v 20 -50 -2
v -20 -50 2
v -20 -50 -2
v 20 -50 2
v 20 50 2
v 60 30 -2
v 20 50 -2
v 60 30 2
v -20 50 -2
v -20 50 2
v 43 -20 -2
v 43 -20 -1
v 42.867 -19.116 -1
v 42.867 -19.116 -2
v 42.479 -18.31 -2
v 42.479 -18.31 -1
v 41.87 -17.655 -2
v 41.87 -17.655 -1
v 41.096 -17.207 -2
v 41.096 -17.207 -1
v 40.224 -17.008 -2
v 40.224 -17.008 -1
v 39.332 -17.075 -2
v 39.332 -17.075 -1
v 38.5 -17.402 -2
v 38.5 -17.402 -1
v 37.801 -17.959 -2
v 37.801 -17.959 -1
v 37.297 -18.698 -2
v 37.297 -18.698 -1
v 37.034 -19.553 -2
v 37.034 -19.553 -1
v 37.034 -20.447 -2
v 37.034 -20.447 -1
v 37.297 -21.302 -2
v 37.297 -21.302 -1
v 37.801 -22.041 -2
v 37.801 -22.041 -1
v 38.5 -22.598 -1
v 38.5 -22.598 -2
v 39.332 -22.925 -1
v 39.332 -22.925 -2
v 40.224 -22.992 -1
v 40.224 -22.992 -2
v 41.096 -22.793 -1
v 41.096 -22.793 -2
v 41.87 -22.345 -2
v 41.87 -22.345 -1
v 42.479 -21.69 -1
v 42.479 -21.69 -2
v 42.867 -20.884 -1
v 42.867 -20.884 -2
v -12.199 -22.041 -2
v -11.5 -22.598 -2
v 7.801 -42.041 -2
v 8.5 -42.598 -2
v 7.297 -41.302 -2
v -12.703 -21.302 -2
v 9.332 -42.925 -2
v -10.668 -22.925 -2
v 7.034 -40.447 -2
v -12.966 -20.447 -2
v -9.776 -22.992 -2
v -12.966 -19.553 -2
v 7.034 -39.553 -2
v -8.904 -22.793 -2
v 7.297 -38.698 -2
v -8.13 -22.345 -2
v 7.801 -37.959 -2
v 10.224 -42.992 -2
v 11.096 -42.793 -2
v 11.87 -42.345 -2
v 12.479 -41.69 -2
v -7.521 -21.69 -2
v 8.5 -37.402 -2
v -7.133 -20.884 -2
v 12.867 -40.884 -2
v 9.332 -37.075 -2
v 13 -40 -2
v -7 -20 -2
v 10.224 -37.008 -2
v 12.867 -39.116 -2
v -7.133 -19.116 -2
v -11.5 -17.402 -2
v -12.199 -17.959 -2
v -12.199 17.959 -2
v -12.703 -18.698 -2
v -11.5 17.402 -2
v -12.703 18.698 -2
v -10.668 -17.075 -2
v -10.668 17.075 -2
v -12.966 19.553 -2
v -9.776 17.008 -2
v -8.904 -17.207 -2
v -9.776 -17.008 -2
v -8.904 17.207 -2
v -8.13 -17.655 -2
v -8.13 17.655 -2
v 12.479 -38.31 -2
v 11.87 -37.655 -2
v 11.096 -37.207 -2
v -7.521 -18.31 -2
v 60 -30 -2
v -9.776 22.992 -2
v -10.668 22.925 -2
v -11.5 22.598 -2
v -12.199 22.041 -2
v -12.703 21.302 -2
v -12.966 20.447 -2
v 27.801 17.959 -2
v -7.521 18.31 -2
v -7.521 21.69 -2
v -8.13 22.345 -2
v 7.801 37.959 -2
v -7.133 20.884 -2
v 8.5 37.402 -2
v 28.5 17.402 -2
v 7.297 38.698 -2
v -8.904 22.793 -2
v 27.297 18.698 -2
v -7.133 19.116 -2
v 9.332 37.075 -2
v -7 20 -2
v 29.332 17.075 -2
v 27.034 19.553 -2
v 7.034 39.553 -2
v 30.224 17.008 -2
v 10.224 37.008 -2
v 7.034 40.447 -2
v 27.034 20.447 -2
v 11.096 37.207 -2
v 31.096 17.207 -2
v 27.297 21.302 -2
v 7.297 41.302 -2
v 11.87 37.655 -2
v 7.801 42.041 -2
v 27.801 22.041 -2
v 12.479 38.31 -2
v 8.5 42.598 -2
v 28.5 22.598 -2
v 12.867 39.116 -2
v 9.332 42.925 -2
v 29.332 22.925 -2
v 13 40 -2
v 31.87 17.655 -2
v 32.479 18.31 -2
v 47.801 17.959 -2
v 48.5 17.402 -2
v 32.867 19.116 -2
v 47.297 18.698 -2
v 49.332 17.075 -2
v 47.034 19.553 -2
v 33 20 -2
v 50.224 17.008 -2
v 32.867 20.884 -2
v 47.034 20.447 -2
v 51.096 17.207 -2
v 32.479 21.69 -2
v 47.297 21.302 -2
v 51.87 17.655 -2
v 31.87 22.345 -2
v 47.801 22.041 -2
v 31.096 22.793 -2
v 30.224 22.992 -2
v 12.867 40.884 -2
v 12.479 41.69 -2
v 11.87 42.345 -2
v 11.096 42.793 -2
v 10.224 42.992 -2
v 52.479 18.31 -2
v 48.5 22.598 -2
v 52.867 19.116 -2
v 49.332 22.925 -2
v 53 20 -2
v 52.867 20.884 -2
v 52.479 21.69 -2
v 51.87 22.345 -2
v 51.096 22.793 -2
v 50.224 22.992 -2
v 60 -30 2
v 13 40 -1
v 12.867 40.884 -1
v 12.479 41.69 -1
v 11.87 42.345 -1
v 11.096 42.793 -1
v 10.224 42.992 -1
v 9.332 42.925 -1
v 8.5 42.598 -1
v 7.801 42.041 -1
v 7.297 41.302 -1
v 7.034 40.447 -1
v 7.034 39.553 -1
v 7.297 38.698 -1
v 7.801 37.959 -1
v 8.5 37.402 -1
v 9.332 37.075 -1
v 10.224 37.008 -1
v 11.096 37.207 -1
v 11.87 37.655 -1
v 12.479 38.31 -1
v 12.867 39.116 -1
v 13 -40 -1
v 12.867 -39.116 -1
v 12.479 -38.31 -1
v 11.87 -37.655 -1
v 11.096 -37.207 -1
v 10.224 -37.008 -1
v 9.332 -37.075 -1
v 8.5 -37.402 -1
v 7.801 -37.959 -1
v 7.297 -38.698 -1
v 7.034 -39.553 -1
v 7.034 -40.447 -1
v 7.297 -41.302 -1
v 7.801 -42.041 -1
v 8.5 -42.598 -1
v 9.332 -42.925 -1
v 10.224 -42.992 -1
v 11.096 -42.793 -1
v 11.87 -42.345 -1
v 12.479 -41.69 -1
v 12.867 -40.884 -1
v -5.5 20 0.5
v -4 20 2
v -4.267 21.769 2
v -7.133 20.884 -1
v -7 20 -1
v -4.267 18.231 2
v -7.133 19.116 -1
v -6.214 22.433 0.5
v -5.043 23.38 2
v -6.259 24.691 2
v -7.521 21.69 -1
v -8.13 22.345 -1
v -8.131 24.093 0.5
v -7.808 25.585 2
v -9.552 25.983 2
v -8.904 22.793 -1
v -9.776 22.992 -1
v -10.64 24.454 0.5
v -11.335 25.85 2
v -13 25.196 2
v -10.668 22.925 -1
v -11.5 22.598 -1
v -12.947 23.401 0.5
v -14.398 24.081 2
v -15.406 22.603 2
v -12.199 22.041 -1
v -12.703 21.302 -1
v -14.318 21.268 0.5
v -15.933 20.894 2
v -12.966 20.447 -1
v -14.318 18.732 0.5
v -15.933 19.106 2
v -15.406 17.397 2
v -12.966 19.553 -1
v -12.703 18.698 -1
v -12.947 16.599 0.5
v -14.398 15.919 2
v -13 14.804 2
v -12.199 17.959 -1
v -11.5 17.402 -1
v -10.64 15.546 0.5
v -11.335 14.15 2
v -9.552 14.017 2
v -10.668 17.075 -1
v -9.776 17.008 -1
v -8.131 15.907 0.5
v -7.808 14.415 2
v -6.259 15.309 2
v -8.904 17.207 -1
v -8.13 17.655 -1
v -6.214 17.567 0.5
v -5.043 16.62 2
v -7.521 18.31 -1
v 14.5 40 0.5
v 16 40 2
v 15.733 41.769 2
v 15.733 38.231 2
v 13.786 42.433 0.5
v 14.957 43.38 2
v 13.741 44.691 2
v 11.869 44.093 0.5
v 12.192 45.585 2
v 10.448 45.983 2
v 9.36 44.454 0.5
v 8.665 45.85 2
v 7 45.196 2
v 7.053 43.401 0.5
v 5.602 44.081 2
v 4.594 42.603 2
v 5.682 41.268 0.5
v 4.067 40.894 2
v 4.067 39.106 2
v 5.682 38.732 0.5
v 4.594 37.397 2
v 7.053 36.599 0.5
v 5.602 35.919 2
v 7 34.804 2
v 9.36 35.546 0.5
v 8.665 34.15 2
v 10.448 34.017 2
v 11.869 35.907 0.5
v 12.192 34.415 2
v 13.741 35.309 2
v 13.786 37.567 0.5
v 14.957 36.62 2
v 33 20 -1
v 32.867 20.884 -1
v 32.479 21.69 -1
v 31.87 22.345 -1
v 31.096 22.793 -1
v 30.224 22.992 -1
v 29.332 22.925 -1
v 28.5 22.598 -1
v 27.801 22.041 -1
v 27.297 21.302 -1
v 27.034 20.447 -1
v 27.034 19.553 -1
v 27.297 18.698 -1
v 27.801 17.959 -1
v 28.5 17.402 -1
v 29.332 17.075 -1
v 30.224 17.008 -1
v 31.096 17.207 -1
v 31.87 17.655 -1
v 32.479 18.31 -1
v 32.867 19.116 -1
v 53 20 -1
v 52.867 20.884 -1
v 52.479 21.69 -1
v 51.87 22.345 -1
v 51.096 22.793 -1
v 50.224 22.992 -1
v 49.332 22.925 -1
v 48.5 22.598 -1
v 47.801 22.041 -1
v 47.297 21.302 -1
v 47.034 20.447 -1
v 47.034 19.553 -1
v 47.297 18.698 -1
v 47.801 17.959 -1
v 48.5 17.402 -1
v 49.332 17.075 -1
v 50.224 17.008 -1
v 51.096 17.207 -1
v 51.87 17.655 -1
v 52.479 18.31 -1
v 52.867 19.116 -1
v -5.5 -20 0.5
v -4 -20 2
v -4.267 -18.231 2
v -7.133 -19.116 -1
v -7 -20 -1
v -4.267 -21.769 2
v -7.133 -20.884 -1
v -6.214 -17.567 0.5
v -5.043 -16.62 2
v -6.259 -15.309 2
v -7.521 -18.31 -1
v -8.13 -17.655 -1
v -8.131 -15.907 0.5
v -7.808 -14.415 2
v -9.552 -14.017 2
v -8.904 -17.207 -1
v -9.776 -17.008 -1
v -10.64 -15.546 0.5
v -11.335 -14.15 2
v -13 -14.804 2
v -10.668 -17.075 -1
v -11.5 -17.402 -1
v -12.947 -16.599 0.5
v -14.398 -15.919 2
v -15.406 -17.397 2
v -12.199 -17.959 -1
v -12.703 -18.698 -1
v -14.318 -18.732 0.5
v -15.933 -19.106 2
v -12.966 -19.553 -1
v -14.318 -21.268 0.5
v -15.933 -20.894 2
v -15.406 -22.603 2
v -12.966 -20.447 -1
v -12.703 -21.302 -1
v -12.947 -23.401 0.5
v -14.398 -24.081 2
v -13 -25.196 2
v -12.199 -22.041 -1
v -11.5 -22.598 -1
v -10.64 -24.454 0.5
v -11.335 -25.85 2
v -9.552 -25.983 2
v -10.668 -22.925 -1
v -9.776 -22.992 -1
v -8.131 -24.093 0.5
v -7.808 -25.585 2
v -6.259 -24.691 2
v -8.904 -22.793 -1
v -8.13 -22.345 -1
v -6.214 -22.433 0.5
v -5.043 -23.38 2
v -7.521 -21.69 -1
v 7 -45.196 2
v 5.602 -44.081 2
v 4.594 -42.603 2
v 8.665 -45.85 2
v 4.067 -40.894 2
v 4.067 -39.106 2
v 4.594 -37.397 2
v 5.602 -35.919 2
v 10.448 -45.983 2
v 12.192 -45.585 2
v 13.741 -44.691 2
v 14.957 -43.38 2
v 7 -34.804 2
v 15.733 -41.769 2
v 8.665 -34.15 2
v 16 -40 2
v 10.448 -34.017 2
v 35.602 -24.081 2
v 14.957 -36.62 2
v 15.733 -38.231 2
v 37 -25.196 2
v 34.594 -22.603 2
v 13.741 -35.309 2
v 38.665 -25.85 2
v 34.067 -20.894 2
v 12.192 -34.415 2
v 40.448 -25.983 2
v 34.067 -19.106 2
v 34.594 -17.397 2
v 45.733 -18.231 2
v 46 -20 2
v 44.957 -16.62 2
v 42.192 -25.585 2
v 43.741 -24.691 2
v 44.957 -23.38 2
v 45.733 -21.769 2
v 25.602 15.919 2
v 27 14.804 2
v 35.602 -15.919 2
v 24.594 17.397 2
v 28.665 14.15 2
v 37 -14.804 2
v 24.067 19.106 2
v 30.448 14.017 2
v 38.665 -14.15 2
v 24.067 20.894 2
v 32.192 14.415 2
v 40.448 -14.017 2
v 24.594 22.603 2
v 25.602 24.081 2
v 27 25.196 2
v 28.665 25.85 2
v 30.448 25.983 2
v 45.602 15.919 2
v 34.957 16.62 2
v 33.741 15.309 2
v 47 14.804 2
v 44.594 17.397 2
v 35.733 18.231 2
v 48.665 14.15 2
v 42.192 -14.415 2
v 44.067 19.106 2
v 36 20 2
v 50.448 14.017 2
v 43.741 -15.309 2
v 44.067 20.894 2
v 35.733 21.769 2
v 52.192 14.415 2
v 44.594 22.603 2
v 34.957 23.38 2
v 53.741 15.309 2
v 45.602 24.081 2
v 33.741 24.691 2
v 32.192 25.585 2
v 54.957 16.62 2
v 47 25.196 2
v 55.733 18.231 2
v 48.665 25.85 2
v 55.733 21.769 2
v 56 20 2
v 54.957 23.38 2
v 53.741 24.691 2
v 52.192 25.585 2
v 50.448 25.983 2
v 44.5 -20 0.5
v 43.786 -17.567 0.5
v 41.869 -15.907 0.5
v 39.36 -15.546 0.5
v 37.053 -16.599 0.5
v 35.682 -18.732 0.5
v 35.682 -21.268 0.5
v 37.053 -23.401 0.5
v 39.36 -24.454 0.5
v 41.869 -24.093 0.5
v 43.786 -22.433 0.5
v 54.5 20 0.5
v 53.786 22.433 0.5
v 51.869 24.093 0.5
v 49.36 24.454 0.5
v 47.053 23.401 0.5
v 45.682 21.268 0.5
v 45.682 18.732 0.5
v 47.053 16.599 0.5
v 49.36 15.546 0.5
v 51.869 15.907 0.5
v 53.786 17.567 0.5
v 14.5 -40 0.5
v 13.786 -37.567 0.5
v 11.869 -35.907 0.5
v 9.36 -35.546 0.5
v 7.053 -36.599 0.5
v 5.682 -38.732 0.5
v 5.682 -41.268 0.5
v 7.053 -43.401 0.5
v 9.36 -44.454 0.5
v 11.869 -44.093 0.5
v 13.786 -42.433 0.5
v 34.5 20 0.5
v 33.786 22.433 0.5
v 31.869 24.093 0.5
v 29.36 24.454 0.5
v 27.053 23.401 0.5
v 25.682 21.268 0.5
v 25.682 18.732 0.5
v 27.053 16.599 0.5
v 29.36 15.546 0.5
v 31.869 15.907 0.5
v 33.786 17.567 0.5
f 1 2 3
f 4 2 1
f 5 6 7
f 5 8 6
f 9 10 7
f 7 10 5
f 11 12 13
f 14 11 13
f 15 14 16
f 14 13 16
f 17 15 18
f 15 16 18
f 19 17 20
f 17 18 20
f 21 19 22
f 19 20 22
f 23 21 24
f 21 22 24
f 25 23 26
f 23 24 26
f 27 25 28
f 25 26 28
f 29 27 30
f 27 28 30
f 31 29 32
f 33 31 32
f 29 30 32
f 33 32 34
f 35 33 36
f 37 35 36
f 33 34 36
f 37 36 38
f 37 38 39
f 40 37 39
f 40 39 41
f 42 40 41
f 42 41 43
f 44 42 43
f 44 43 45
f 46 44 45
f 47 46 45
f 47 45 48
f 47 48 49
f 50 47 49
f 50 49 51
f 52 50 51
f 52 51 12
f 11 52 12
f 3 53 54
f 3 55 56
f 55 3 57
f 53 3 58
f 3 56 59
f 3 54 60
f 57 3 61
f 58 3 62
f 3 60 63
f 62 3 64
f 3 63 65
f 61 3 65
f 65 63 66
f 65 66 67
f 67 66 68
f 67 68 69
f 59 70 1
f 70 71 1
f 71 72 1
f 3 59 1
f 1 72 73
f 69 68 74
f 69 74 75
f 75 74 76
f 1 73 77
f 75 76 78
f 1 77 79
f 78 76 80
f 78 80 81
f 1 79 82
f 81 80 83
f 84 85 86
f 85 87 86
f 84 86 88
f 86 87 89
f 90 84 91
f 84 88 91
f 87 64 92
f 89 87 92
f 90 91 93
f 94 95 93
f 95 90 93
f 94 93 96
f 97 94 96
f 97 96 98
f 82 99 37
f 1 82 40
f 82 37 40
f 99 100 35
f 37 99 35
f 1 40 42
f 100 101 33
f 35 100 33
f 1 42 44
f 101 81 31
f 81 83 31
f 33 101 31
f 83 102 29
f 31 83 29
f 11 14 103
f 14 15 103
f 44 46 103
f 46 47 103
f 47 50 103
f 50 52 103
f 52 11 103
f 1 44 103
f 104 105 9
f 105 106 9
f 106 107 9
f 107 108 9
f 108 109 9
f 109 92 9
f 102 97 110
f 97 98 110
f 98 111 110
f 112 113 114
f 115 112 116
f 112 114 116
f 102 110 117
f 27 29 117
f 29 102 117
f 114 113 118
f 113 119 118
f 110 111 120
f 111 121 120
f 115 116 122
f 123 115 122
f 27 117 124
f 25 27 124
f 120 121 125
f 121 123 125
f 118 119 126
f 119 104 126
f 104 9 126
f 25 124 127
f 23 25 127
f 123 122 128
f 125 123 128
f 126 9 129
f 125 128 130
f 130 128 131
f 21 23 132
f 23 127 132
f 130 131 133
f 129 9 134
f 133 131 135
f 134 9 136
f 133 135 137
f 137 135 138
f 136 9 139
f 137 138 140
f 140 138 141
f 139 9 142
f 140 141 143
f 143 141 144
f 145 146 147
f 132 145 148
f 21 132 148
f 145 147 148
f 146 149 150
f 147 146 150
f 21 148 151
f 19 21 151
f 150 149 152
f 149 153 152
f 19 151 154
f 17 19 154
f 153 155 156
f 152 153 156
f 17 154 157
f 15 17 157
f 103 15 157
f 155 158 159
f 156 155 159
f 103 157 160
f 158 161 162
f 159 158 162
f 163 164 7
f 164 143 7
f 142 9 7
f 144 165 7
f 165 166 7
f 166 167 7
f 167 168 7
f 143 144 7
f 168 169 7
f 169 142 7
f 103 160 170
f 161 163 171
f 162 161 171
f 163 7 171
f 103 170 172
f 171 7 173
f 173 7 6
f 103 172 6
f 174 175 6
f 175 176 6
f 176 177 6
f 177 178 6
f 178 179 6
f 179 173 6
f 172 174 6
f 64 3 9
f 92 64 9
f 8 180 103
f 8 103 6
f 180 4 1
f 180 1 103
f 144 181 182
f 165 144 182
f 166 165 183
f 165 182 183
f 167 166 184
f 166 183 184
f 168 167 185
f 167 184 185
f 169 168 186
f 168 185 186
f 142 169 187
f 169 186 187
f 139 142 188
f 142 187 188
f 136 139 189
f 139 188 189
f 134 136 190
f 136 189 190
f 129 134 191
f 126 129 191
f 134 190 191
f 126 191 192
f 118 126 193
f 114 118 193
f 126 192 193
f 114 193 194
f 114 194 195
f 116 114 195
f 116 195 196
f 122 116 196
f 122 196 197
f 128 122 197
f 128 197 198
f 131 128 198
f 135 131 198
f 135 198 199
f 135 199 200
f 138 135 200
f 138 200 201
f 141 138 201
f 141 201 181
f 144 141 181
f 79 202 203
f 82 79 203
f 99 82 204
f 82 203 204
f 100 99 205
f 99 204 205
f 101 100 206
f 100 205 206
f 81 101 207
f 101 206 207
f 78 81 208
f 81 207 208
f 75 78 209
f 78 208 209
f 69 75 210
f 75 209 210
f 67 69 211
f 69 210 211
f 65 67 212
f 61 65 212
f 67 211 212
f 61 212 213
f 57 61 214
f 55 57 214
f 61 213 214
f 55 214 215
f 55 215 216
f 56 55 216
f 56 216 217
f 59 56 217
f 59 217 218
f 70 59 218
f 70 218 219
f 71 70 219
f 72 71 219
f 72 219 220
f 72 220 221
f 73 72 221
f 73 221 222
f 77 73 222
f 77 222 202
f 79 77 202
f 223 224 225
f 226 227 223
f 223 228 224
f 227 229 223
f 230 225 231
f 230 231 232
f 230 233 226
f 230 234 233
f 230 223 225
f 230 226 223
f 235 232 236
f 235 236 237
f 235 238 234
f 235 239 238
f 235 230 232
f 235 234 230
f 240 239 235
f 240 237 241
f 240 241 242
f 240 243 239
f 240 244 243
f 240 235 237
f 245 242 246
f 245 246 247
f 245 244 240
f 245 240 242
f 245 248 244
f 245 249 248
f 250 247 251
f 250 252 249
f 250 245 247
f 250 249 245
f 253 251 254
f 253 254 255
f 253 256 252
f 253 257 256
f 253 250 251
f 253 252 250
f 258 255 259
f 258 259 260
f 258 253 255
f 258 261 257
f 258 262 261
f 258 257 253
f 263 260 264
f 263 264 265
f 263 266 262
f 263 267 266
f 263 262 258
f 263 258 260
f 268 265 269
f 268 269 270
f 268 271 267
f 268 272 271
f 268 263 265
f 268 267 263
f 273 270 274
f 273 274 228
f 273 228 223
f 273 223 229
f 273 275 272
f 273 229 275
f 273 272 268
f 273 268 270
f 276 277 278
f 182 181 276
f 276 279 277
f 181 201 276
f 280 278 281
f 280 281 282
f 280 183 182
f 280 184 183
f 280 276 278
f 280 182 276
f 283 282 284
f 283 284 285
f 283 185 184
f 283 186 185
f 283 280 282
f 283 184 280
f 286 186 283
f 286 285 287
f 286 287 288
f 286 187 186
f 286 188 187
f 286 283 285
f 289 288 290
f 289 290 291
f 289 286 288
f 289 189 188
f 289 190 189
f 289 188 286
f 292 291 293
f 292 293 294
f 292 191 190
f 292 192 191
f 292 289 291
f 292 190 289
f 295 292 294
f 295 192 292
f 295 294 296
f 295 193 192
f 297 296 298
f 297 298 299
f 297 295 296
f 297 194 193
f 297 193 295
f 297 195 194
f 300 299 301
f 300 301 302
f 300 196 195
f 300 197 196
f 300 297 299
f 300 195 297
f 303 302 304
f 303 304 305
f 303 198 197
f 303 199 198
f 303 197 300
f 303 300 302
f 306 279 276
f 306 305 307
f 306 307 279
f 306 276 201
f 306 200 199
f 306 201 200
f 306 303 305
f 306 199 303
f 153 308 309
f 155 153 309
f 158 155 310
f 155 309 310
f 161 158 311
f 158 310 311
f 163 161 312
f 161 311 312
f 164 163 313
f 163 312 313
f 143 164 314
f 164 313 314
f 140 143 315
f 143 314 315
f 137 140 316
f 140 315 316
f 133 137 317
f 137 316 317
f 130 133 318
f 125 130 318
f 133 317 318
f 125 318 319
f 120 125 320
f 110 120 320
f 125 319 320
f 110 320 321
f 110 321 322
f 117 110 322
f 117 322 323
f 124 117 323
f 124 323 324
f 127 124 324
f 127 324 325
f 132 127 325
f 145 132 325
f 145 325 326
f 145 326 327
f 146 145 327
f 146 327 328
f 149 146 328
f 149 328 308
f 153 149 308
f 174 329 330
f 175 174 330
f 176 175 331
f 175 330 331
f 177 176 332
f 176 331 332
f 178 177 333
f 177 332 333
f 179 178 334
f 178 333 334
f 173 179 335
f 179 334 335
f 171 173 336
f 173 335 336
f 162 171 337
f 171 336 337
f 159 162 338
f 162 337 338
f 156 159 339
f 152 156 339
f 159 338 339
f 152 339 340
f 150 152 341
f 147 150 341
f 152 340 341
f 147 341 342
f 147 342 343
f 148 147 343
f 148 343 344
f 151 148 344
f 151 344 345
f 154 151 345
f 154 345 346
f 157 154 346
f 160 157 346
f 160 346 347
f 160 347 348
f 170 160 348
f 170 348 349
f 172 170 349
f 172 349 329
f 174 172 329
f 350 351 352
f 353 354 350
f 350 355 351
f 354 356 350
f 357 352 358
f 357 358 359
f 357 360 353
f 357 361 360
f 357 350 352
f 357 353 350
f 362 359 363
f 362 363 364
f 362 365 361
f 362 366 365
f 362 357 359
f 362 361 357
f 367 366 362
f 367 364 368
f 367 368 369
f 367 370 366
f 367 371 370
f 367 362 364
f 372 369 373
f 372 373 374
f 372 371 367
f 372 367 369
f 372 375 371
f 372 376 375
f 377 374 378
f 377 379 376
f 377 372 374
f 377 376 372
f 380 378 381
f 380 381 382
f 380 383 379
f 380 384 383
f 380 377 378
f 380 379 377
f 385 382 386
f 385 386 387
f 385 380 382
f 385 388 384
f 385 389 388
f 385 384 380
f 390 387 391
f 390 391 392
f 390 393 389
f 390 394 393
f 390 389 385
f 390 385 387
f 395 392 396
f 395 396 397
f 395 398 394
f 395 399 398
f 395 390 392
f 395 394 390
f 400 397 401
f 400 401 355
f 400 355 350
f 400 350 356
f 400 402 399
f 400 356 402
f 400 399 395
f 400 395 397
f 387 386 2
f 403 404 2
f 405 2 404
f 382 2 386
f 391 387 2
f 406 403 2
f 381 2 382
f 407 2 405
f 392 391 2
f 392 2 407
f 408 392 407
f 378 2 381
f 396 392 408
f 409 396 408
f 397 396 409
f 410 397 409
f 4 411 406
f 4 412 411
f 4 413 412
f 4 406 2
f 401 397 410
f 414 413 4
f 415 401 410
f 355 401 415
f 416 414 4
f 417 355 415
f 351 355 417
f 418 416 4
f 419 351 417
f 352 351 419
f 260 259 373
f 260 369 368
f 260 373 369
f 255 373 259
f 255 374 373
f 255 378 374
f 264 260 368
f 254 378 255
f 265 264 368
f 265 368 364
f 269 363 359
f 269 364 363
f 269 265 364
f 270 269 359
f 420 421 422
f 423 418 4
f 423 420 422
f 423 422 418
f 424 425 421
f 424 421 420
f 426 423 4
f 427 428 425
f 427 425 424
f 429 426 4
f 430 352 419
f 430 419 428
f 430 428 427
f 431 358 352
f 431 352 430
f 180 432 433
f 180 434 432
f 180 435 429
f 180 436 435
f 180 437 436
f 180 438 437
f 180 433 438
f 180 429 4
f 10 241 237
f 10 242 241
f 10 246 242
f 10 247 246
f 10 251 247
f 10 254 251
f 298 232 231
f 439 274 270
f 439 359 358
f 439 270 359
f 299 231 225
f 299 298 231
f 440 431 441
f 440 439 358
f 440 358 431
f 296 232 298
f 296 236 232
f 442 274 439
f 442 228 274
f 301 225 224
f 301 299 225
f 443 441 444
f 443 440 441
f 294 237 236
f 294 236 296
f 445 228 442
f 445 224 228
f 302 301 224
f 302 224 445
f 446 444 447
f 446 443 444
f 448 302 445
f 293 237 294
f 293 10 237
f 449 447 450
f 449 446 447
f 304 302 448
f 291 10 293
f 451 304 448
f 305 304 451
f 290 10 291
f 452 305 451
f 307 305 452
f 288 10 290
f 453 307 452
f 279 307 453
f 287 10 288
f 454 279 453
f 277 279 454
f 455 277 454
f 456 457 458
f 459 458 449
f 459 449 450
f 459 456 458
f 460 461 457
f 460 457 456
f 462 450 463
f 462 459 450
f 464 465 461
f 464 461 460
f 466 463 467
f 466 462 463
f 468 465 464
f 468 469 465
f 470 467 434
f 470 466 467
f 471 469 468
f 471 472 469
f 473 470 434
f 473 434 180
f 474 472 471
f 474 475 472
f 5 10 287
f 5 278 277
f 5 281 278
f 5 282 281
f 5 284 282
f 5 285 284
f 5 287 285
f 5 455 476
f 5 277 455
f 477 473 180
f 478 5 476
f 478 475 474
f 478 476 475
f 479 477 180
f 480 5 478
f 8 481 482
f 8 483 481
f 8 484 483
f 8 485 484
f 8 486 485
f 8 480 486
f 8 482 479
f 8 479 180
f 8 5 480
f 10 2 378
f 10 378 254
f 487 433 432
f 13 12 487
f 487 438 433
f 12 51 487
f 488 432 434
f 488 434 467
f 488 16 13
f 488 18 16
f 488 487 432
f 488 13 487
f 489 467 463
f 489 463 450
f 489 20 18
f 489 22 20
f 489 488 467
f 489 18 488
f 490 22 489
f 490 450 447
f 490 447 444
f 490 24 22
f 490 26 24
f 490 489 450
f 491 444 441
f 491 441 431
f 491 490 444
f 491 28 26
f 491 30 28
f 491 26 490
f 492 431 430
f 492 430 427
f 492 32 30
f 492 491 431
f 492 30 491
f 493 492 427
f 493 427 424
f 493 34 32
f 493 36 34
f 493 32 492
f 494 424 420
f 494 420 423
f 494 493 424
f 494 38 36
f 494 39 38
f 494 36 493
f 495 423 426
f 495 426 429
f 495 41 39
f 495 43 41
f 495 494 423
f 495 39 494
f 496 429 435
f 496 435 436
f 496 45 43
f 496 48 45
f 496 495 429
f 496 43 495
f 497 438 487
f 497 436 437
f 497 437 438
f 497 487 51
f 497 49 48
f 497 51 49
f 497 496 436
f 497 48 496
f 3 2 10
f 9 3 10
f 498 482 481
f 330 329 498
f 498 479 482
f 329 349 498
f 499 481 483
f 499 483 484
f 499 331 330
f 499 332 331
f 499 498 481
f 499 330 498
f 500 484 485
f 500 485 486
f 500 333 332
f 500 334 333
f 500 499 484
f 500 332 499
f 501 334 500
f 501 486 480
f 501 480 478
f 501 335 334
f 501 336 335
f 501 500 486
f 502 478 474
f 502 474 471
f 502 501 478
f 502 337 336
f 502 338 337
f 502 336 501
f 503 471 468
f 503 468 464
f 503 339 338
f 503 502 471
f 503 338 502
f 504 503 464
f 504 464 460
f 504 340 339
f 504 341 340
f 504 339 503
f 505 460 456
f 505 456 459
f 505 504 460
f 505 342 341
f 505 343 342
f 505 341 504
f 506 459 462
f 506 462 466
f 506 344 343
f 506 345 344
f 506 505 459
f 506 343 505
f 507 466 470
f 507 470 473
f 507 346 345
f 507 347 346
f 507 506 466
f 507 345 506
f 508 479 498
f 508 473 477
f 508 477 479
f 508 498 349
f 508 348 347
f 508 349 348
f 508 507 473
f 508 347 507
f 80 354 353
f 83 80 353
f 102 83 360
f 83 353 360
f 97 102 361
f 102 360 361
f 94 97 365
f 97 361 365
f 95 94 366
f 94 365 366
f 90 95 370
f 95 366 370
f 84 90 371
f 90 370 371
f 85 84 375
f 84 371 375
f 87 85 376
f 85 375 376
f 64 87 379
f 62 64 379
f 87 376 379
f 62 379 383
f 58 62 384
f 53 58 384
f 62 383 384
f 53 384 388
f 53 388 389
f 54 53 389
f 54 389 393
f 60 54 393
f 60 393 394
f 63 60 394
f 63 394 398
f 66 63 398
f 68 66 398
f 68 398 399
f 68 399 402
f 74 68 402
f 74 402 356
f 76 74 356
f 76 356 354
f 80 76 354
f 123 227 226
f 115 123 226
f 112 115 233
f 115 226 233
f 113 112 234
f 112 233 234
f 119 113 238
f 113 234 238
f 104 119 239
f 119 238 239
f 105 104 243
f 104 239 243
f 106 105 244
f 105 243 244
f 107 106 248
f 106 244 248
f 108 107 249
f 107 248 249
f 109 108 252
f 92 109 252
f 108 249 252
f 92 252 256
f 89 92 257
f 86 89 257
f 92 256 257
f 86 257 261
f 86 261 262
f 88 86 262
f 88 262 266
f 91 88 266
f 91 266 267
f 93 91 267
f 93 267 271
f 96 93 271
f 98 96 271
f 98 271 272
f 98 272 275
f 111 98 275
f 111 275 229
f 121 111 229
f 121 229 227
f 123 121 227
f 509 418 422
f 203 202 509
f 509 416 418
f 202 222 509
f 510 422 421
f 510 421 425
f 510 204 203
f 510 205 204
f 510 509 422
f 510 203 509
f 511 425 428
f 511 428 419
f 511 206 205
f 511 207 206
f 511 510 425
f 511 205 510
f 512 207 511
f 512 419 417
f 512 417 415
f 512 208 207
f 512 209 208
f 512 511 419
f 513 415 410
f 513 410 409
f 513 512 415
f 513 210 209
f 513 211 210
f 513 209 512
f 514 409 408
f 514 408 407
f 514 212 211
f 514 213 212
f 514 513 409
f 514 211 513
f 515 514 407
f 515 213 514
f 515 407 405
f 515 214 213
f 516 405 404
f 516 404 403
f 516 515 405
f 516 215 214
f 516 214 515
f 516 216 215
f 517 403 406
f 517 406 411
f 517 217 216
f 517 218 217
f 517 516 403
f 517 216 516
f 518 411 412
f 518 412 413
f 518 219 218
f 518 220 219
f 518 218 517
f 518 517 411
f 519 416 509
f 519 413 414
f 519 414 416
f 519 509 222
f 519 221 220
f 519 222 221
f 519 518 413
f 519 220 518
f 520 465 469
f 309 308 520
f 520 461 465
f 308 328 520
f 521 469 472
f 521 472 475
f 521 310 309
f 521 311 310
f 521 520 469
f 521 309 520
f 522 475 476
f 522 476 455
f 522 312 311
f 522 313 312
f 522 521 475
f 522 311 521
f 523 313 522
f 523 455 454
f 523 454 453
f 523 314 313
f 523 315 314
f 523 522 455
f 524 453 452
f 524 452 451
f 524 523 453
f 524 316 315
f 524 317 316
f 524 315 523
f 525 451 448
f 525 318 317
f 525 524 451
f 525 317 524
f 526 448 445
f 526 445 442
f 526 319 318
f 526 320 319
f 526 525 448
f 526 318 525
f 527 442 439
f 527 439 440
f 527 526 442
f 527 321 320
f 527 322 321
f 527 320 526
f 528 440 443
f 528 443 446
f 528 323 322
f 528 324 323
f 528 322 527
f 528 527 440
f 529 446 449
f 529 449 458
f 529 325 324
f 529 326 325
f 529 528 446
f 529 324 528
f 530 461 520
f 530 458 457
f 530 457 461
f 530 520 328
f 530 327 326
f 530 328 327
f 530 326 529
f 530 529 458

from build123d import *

# Parameters (mm, degrees)
SKETCH1_W           = 40
SKETCH1_H           = 100
SKETCH1_H_2         = 60
BOSS_EXTRUDE1_DEPTH = 2
SKETCH2_R           = 3
CUT_EXTRUDE1_DEPTH  = 5
CHAMFER1_SIZE       = 3


with BuildPart() as part:
    # Sketch1 → Boss-Extrude1 (new body, symmetric)
    with BuildSketch(Plane.XY):
        Rectangle(SKETCH1_W, SKETCH1_H)
        Polygon((60, 30), (20, 50), (20, 30), align=None)
        with Locations((40, 0)):
            Rectangle(SKETCH1_W, SKETCH1_H_2)
        Polygon((20, -50), (60, -30), (20, -30), align=None)
    extrude(amount=BOSS_EXTRUDE1_DEPTH, both=True)

    # Sketch2 → Cut-Extrude1 (cut, through all)
    with BuildSketch(Plane.XY.offset(2)):
        with Locations((-10, 20)):
            Circle(SKETCH2_R)
        with Locations((-10, -20)):
            Circle(SKETCH2_R)
        with Locations((10, -40)):
            Circle(SKETCH2_R)
        with Locations((40, -20)):
            Circle(SKETCH2_R)
        with Locations((30, 20)):
            Circle(SKETCH2_R)
        with Locations((50, 20)):
            Circle(SKETCH2_R)
        with Locations((10, 40)):
            Circle(SKETCH2_R)
    extrude(amount=-CUT_EXTRUDE1_DEPTH, mode=Mode.SUBTRACT)

    # Chamfer1
    chamfer1_edges = [part.edges().sort_by_distance(p)[0] for p in [
        (37, -20, 2),
        (7, -40, 2),
        (-13, -20, 2),
        (7, 40, 2),
        (27, 20, 2),
        (47, 20, 2),
        (-13, 20, 2),
    ]]
    chamfer(chamfer1_edges, length=CHAMFER1_SIZE)


solid = part.part
